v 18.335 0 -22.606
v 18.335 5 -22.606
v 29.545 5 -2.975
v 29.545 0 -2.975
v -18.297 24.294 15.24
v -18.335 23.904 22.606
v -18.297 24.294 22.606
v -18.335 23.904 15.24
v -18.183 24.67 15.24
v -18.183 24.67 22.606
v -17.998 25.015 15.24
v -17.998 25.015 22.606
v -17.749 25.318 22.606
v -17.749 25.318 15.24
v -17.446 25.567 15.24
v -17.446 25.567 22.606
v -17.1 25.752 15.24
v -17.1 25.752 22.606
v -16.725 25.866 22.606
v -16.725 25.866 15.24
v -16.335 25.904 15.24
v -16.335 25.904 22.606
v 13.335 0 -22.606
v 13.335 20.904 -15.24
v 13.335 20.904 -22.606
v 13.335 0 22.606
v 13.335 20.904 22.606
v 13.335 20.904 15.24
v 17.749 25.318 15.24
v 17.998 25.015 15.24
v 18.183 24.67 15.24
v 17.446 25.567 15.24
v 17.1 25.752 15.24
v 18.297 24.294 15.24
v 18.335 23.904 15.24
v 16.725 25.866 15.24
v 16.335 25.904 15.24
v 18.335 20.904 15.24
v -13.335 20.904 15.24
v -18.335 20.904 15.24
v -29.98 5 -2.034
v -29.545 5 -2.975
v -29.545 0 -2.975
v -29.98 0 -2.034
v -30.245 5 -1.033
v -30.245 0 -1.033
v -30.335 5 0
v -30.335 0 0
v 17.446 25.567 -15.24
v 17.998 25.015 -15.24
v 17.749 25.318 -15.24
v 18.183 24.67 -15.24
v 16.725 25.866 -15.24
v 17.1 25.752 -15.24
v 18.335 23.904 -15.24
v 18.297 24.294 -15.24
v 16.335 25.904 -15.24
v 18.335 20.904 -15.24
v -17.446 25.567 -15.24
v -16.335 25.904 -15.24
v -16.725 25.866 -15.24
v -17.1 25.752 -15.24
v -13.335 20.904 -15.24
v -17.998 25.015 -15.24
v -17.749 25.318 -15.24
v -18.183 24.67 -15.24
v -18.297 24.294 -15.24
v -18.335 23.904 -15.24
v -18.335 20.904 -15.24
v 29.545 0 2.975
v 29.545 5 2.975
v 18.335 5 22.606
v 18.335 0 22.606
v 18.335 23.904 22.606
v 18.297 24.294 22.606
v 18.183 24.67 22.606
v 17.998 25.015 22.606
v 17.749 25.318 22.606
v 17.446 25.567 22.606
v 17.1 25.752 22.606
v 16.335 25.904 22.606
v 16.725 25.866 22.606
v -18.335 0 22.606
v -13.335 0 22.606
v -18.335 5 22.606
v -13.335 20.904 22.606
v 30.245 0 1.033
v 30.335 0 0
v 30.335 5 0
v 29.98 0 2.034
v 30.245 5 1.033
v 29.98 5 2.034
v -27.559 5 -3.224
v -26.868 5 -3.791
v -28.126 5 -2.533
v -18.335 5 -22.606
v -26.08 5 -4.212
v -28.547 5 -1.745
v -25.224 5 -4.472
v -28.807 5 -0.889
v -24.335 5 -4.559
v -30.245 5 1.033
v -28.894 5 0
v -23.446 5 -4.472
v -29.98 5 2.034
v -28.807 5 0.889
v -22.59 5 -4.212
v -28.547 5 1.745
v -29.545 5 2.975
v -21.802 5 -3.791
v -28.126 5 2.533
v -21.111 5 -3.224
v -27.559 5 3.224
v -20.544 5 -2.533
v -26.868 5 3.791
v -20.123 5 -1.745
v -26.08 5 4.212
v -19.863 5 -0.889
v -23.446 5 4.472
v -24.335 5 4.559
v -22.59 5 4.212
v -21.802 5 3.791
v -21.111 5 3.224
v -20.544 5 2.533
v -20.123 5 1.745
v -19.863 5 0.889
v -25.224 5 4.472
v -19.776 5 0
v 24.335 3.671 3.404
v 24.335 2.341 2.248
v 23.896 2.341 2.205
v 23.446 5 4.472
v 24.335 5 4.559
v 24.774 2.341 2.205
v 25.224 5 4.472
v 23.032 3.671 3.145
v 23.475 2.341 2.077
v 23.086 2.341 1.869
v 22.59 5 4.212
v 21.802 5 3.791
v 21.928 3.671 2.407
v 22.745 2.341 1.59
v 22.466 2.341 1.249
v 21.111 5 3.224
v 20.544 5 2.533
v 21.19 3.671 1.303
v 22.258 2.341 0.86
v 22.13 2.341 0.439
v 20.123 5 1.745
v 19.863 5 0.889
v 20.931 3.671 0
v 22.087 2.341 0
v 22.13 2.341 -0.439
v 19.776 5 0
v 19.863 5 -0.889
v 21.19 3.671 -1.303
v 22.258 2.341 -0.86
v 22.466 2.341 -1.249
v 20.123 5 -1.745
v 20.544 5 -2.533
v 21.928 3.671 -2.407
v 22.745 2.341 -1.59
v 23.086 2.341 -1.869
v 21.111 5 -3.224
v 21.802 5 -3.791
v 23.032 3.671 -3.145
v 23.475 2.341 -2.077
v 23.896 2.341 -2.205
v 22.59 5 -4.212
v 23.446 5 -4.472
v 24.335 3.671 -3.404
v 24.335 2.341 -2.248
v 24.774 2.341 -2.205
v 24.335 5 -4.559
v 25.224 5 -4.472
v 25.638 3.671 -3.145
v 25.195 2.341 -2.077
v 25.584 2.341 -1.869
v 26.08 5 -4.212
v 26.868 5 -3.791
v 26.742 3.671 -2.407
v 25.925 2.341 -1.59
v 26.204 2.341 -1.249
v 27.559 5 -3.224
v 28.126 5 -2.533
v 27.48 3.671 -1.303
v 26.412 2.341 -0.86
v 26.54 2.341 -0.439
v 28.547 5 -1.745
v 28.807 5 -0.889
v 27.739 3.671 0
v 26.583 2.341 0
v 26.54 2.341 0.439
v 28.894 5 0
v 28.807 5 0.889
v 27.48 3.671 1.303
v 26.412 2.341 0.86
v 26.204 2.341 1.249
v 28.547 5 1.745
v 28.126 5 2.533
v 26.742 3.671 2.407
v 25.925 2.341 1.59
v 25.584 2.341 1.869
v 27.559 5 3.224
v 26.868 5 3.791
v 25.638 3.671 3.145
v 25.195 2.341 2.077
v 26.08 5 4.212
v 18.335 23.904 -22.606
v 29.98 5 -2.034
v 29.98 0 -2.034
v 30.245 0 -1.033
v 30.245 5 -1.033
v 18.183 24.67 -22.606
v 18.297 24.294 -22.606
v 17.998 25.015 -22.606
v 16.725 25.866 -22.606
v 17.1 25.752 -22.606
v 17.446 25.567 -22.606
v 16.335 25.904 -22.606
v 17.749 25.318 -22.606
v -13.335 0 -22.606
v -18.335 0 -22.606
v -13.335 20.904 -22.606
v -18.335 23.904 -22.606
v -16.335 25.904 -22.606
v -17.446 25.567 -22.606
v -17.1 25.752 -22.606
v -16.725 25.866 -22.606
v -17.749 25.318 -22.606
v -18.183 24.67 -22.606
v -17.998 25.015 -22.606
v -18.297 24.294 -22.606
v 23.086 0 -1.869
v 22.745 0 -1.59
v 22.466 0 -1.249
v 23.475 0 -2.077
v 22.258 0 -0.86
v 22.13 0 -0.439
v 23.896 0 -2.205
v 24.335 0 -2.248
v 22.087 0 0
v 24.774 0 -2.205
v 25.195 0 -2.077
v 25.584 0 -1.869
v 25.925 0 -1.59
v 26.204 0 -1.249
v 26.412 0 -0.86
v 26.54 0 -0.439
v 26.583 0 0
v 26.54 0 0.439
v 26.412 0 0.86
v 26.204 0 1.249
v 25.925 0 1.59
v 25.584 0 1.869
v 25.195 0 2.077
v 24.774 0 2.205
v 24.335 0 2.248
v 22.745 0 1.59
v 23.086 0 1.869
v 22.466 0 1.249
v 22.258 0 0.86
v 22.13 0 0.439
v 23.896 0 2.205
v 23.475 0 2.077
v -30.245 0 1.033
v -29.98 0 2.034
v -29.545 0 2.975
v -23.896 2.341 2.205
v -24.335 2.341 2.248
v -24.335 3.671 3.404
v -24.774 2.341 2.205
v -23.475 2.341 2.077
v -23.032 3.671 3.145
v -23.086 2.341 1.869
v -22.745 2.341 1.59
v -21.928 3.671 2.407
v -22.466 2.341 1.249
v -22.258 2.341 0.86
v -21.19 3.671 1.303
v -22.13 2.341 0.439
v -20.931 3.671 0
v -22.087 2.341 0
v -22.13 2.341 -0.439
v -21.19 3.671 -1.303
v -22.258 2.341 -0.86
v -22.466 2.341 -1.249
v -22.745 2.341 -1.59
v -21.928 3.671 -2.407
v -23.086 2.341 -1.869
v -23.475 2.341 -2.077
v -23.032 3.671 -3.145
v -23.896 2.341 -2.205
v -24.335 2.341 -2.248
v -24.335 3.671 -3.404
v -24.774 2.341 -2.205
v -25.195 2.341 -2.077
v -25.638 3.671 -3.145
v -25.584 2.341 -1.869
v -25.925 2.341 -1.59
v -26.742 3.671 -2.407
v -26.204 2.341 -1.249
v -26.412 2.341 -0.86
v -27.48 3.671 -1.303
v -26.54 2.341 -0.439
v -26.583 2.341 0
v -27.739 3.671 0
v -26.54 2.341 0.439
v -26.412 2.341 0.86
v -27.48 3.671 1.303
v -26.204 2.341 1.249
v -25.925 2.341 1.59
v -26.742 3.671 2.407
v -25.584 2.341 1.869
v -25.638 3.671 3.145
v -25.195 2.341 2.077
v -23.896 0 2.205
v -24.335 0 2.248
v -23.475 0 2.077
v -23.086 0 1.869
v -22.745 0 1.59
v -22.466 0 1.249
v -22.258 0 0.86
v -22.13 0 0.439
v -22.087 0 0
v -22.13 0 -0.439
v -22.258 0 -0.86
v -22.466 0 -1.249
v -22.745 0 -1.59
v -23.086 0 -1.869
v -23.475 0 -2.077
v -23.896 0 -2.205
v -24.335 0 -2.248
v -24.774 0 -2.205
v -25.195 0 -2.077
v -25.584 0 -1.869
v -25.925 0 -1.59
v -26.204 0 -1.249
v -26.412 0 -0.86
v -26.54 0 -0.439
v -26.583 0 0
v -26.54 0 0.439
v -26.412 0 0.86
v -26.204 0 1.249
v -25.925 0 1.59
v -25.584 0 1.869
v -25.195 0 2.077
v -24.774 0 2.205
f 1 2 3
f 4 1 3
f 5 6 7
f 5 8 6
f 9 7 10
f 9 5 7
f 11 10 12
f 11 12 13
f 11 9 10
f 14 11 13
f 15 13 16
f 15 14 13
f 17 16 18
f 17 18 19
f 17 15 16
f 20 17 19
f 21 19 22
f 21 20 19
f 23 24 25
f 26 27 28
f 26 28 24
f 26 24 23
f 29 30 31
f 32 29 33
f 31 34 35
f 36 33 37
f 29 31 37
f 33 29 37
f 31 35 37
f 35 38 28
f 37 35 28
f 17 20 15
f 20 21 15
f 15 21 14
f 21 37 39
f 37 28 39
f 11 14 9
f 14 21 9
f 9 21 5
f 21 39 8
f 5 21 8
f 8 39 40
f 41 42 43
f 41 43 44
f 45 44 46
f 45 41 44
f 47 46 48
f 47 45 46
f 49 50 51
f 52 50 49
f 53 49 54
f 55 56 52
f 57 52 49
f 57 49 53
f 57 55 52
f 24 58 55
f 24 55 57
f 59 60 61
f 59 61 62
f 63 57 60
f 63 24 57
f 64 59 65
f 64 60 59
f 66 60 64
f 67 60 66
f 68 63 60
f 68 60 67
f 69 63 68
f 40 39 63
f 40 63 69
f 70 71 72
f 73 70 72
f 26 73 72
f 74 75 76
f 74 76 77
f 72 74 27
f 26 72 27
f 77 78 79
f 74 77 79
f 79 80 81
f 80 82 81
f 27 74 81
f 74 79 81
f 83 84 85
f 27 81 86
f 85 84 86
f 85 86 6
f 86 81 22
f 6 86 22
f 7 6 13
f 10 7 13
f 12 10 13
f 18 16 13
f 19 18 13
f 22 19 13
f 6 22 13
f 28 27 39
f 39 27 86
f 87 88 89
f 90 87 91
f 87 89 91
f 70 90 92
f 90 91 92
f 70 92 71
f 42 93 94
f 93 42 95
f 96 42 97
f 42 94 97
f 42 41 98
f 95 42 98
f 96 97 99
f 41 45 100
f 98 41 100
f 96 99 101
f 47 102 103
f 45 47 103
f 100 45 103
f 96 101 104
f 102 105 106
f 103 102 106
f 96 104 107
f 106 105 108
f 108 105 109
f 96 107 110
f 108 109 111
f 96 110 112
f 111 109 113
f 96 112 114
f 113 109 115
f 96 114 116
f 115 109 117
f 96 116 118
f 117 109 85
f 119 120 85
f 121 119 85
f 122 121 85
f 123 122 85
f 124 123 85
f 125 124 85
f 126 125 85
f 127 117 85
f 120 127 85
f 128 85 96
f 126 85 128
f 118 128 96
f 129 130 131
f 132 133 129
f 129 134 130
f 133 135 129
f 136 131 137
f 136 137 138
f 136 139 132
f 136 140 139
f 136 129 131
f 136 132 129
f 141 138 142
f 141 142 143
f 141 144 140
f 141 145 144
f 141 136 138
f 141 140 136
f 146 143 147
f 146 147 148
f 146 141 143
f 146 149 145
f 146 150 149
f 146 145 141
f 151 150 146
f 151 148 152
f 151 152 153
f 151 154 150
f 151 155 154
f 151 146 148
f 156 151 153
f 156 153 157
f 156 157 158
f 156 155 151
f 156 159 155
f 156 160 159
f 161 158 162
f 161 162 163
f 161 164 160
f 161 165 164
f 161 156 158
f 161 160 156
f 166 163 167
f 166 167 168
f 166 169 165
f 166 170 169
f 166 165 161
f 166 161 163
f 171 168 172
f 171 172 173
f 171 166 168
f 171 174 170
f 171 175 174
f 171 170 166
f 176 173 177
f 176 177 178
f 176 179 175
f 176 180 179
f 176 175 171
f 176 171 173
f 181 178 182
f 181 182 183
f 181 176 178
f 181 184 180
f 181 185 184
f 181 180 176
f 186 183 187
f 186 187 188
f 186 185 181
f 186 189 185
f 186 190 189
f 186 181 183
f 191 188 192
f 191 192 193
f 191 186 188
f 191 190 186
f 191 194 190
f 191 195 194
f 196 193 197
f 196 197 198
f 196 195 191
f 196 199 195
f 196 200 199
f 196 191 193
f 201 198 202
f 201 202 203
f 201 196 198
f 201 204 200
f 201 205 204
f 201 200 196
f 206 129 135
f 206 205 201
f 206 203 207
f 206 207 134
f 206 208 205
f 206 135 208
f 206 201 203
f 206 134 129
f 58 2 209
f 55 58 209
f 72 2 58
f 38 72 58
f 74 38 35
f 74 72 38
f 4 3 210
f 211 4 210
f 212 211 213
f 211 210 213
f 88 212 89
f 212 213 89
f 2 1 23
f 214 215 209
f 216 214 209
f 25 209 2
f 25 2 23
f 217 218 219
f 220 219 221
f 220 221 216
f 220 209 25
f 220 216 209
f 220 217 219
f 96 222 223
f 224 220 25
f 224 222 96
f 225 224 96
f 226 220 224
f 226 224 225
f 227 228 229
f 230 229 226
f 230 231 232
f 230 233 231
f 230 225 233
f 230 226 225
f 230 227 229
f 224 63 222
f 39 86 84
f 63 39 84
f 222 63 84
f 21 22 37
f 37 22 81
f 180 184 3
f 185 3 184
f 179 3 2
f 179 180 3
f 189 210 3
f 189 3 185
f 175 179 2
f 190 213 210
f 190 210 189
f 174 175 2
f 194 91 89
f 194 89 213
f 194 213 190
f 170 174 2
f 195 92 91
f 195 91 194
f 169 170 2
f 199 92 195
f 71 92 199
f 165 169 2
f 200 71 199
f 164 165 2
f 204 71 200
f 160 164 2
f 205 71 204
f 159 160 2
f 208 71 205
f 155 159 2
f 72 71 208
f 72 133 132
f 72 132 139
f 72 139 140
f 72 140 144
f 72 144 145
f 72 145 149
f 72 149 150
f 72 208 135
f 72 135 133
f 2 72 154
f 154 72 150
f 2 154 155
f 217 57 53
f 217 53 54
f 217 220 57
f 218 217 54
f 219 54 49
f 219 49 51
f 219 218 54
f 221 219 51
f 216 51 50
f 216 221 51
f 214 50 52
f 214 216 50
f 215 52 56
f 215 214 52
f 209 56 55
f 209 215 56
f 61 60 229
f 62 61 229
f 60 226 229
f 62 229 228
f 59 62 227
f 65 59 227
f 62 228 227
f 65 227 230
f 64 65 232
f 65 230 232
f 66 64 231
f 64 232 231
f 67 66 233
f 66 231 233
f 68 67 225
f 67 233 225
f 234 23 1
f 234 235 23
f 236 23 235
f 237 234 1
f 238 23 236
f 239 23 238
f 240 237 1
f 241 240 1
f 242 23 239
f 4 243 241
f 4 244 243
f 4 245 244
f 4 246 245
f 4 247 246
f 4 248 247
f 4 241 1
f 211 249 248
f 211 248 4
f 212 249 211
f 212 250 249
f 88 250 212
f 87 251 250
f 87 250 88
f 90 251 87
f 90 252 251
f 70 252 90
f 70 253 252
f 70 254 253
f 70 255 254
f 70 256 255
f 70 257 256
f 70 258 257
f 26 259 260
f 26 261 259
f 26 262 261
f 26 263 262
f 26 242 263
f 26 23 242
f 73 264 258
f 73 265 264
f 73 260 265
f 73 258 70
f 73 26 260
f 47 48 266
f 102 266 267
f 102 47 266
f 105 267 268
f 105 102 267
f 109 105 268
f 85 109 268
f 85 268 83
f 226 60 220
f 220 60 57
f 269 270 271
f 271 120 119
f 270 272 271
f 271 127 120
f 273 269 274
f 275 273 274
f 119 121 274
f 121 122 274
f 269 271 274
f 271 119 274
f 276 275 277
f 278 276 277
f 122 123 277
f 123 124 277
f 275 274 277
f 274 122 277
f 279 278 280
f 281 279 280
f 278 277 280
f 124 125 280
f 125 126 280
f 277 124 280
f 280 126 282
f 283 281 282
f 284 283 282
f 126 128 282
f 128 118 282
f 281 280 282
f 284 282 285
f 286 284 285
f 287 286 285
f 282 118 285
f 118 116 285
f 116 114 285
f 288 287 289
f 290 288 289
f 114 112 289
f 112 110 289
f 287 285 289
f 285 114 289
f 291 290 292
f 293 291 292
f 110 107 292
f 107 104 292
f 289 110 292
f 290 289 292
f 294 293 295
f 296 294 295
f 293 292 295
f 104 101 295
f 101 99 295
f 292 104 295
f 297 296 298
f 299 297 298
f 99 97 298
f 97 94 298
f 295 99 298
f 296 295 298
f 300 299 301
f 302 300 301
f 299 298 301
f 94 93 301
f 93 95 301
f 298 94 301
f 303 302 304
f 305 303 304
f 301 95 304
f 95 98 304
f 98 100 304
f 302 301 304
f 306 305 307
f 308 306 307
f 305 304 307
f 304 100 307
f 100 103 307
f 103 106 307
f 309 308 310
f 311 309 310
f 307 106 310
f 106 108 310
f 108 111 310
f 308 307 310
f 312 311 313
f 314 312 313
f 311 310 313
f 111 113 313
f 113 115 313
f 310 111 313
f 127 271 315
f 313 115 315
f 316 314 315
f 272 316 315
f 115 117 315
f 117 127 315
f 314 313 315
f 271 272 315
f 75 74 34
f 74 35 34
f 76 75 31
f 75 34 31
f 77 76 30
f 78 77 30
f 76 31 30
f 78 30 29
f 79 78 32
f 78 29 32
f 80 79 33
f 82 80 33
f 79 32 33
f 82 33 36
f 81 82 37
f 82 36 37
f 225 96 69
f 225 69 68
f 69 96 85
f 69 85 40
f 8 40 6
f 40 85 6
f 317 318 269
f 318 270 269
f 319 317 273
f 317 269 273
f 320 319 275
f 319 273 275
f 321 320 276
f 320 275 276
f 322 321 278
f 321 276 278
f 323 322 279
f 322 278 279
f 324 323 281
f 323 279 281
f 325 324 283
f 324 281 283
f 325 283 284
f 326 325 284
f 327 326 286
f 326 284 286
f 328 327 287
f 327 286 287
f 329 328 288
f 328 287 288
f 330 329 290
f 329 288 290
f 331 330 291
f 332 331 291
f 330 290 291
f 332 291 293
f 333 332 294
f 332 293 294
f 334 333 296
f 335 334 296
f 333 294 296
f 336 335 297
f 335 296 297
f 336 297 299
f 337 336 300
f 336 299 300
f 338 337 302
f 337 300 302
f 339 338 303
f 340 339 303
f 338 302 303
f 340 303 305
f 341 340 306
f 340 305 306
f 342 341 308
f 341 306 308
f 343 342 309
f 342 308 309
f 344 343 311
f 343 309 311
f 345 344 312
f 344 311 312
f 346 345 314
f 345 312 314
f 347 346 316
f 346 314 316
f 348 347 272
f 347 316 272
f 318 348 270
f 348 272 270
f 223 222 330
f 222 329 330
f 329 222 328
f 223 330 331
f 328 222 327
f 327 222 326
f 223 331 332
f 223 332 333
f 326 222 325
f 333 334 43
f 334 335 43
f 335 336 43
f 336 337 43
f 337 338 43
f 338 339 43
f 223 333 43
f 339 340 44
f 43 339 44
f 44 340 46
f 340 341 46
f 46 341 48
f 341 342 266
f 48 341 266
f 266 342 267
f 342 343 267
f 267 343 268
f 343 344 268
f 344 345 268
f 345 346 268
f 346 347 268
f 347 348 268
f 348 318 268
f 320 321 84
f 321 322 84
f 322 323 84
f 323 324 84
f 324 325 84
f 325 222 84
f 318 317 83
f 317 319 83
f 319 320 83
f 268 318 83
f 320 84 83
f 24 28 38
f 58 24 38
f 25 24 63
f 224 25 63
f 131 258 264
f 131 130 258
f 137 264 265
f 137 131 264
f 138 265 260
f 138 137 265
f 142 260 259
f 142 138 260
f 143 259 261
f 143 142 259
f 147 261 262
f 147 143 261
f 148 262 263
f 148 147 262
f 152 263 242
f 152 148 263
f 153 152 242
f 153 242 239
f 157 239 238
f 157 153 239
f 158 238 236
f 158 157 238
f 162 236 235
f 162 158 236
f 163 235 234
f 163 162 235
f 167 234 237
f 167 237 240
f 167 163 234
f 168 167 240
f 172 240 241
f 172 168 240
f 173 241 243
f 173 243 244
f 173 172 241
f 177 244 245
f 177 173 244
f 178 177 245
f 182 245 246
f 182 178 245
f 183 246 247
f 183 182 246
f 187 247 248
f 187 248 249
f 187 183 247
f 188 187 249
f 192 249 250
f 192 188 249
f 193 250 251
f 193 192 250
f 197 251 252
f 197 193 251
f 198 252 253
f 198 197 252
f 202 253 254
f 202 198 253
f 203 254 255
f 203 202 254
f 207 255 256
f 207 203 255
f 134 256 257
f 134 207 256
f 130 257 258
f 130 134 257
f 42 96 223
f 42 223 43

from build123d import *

# Parameters (mm, degrees)
BOSS_EXTRUDE1_DEPTH = 22.606
SKETCH2_W           = 32.636558609
SKETCH2_H           = 30.48
CUT_EXTRUDE1_DEPTH  = 6
CUT_EXTRUDE2_DEPTH  = 6
FILLET1_R           = 2


with BuildPart() as part:
    # Sketch1 → Boss-Extrude1 (new body, symmetric)
    with BuildSketch(Plane.XY):
        Polygon((0, 20.9042), (13.335, 20.9042), (13.335, 0), (30.335, 0), (30.335, 5), (18.335, 5), (18.335, 25.9042), (0, 25.9042), align=None)
    extrude(amount=BOSS_EXTRUDE1_DEPTH, both=True)

    # Sketch2 → Cut-Extrude1 (cut, through all)
    with BuildSketch(Plane.XZ.offset(-20.9042)):
        with Locations((16.318279305, 0)):
            Rectangle(SKETCH2_W, SKETCH2_H)
    extrude(amount=-CUT_EXTRUDE1_DEPTH, mode=Mode.SUBTRACT)

    # Sketch4 → CSK for #8 Flat Head Socket Cap Screw1 (revolve, cut)
    with BuildSketch(Plane(origin=(24.335, 5, 0), x_dir=(0, 0, 1), z_dir=(1, 0, 0))):
        Polygon((0, 0), (0, 5), (2.2479, 5), (2.2479, 2.658961536), (4.5593, 0), align=None)
    revolve(axis=Axis((24.335, 11.35, 0), (0, -1, 0)), mode=Mode.SUBTRACT)

    # Sketch5 → Cut-Extrude2 (cut, through all)
    with BuildSketch(Plane(origin=(0, 5, 0), x_dir=(1, 0, 0), z_dir=(0, 1, 0))):
        with BuildLine():
            Line((30.335, 22.606), (18.335, 22.606))
            Line((18.335, 22.606), (29.545282756, 2.975391336))
            ThreePointArc((29.545282756, 2.975391336), (30.134211001, 1.539204912), (30.335, 2.1e-08))
            Line((30.335, 2.1e-08), (30.335, 22.606))
        make_face()
        with BuildLine():
            Line((30.335, -22.606), (30.335, 2.1e-08))
            ThreePointArc((30.335, 2.1e-08), (30.134211007, -1.539204892), (29.545282756, -2.975391336))
            Line((29.545282756, -2.975391336), (18.335, -22.606))
            Line((18.335, -22.606), (30.335, -22.606))
        make_face()
    extrude(amount=-CUT_EXTRUDE2_DEPTH, mode=Mode.SUBTRACT)

    # Fillet1
    fillet1_edges = [part.edges().sort_by_distance(p)[0] for p in [
        (18.335, 25.9042, 18.923),
        (18.335, 25.9042, -18.923),
    ]]
    fillet(fillet1_edges, radius=FILLET1_R)

    # Mirror1: part across plane


with BuildPart() as part_1:
    add(part.part)
    add(part.part.mirror(Plane(origin=(0, 0, 0), x_dir=(0, 0, 1), z_dir=(1, 0, 0))))


solid = part_1.part
